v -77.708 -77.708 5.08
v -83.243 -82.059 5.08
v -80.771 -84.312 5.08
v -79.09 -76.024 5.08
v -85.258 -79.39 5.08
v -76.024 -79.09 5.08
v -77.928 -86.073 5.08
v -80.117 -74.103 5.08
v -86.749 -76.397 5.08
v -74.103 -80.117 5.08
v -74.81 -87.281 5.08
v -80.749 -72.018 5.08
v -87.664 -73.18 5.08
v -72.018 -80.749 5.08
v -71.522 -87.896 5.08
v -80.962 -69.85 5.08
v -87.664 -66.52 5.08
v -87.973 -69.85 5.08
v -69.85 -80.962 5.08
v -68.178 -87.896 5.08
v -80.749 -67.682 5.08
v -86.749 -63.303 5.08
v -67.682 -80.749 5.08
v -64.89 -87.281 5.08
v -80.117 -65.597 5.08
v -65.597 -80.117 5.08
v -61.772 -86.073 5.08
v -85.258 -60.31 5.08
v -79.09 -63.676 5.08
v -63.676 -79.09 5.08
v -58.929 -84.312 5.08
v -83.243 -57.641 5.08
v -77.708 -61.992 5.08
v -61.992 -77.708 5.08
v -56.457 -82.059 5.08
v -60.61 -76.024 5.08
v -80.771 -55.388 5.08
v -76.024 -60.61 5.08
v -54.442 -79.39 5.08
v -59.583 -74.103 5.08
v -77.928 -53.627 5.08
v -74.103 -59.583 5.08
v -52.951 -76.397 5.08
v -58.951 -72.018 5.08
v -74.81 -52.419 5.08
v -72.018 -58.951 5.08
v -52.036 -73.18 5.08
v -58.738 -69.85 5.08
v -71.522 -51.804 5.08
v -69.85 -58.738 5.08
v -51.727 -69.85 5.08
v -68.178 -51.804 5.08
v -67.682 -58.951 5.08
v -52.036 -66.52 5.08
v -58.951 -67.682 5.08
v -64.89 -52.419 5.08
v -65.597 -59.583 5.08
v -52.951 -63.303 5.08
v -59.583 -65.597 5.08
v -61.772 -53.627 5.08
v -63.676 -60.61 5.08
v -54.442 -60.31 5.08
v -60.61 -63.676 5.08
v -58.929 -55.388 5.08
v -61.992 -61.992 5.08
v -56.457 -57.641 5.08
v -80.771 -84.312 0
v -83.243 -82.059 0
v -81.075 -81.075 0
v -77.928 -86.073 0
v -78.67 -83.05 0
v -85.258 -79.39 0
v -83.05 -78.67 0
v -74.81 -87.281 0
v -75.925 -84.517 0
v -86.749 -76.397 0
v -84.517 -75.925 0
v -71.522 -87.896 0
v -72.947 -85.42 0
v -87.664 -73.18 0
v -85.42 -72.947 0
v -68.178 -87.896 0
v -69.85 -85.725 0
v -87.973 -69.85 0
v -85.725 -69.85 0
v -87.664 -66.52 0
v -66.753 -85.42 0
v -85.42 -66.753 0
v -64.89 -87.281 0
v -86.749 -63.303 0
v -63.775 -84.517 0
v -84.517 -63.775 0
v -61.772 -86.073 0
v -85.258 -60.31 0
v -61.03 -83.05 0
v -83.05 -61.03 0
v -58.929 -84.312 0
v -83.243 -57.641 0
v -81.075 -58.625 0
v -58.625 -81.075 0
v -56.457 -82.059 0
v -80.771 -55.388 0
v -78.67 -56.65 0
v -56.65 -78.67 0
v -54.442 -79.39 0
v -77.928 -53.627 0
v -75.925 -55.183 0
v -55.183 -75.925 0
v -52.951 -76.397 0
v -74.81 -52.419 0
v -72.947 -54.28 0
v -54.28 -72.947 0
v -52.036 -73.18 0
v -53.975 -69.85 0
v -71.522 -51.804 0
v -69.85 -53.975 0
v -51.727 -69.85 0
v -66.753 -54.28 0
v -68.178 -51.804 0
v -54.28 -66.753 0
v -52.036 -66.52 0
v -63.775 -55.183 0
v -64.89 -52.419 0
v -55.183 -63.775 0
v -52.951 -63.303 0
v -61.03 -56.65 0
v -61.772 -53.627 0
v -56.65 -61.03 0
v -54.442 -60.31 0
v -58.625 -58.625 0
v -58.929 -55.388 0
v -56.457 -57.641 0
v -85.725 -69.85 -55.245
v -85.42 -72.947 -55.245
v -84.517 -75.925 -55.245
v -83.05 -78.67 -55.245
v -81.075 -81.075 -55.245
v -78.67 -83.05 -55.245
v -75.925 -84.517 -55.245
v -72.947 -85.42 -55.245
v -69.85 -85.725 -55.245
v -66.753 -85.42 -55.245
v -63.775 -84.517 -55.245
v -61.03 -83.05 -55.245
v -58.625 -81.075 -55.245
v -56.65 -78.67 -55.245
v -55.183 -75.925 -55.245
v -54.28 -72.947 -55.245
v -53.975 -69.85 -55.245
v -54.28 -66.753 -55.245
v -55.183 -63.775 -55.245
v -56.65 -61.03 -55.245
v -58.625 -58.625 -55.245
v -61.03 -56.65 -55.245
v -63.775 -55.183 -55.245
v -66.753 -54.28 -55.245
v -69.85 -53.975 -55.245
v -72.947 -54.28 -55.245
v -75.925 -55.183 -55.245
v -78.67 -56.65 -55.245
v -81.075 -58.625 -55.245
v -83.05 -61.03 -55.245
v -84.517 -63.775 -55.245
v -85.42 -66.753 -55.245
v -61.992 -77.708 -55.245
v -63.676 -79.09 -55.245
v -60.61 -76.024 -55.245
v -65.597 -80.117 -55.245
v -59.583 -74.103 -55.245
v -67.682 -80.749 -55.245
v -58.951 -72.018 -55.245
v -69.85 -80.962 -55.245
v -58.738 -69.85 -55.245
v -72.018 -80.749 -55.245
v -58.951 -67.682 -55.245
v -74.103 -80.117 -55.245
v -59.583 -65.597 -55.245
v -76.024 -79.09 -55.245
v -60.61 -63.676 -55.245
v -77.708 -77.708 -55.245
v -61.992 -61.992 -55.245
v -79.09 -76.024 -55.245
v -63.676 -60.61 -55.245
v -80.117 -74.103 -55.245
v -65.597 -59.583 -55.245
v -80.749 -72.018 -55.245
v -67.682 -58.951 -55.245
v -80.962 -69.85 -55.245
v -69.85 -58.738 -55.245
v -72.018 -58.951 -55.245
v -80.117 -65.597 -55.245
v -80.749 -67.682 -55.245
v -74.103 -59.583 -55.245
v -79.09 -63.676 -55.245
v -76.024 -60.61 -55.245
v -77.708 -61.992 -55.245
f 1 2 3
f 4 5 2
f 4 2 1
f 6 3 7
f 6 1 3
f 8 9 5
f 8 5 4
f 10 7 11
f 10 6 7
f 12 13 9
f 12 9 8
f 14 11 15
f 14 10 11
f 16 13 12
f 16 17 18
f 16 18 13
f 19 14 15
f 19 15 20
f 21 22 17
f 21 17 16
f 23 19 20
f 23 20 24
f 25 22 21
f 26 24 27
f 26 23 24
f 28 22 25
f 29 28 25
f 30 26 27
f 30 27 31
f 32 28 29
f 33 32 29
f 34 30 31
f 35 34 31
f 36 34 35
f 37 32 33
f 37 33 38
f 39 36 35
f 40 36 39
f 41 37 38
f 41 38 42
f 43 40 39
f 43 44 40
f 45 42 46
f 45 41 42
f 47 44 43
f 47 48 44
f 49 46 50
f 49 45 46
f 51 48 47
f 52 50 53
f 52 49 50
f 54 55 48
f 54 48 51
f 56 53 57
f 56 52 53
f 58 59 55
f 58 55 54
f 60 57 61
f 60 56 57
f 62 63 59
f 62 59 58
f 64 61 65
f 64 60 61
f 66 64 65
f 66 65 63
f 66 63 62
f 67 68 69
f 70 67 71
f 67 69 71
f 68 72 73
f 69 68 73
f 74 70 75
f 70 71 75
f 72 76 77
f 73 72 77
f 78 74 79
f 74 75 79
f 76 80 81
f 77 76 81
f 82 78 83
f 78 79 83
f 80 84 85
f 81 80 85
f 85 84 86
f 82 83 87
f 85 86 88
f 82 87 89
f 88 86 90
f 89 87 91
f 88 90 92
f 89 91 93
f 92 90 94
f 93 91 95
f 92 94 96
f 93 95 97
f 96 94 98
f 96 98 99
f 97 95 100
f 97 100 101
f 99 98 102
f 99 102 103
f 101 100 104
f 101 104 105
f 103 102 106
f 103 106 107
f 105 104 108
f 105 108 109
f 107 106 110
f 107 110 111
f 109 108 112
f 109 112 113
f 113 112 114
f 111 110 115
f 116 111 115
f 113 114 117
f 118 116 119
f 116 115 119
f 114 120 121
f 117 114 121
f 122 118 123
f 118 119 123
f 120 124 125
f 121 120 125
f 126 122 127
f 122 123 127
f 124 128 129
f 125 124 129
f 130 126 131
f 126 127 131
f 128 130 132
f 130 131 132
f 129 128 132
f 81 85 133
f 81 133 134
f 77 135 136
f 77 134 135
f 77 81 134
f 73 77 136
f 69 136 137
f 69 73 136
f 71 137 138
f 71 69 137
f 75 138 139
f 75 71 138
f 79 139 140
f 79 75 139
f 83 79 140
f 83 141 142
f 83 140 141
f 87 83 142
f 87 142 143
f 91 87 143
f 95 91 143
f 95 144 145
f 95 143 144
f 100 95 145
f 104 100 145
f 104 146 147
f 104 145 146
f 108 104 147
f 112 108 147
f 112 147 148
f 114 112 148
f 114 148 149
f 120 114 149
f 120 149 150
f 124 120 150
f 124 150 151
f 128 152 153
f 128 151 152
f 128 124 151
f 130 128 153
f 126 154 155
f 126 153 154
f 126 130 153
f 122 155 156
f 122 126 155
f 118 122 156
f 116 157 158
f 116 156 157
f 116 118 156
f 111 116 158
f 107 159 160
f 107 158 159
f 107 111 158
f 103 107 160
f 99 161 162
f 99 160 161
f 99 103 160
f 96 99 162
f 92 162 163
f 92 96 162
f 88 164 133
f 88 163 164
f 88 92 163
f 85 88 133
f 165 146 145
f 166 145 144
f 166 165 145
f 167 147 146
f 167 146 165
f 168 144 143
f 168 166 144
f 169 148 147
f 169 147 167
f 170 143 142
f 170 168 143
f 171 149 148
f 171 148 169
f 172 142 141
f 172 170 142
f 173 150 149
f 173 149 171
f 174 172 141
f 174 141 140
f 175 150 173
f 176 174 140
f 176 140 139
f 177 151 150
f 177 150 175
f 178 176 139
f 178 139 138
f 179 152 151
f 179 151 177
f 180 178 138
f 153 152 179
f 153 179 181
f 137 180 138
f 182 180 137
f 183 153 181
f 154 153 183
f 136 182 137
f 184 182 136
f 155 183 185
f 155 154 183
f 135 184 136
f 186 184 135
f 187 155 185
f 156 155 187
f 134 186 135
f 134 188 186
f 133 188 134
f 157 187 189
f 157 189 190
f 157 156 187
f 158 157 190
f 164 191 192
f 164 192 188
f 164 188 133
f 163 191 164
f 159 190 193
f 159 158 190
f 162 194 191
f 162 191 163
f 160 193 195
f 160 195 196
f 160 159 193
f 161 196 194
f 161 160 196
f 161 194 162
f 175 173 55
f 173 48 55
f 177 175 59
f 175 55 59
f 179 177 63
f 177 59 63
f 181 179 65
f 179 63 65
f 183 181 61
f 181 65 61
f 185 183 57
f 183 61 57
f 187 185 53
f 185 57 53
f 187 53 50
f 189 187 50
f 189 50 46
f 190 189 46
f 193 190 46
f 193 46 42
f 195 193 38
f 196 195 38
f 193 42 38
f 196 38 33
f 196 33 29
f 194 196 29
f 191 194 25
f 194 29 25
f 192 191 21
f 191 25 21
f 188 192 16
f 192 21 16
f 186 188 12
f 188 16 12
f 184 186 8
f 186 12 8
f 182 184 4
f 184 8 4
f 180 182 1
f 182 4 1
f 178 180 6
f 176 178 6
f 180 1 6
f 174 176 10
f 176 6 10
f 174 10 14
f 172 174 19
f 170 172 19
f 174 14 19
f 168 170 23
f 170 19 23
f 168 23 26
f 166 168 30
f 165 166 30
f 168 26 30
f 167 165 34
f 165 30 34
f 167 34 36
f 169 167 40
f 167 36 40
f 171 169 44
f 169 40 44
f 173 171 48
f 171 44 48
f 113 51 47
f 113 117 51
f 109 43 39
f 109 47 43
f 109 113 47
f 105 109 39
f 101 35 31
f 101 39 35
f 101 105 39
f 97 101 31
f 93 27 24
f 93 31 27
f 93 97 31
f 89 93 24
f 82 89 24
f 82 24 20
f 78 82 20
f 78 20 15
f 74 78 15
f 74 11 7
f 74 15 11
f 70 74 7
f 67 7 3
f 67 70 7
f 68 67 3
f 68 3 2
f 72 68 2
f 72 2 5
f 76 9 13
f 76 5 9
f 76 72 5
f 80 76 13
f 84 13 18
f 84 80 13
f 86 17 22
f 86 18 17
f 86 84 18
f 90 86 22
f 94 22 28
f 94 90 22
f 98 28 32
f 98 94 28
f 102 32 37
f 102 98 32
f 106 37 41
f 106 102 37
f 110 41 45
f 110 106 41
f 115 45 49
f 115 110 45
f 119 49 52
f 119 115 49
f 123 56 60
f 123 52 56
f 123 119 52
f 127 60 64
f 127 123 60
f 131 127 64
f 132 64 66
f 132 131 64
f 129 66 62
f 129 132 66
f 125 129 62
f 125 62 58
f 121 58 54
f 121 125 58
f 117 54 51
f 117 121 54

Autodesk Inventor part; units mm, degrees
ref_plane "YZ Plane" through (0, 0, 0) normal (1, 0, 0) x (0, 1, 0)
ref_plane "XZ Plane" through (0, 0, 0) normal (0, 1, 0) x (-1, 0, 0)
ref_plane "XY Plane" through (0, 0, 0) normal (0, 0, 1) x (1, 0, 0)
sketch "Sketch1" plane through (0, 0, 0) normal (0, 0, 1) x (1, 0, 0)
  circle A0 centre (-69.85, -69.85) radius 15.875 projected
  circle A1 centre (-69.85, -69.85) radius 18.1229
  dimension "d0" = 36.2458
extrude "Extrusion1" add sketch "Sketch1" along normal blind 5.08 contours A0 | A1
sketch "Sketch2" plane through (-69.85, -69.85, 0) normal (0, 0, -1) x (-1, 0, 0)
  circle A0 centre (0, 0) radius 18.1229 projected
  circle A1 centre (0, 0) radius 15.875
  dimension "d3" = 31.75
extrude "Extrusion2" add sketch "Sketch2" along normal blind 55.245 contours A1
sketch "Sketch3" plane through (-69.85, -69.85, 5.08) normal (0, 0, 1) x (1, 0, 0)
  circle A0 centre (0, 0) radius 18.1229 projected
  circle A1 centre (0, 0) radius 11.1125
  dimension "d6" = 22.225
extrude "Extrusion3" cut sketch "Sketch3" against normal through all contours A1
properties part number "Bush bottomplate2"
